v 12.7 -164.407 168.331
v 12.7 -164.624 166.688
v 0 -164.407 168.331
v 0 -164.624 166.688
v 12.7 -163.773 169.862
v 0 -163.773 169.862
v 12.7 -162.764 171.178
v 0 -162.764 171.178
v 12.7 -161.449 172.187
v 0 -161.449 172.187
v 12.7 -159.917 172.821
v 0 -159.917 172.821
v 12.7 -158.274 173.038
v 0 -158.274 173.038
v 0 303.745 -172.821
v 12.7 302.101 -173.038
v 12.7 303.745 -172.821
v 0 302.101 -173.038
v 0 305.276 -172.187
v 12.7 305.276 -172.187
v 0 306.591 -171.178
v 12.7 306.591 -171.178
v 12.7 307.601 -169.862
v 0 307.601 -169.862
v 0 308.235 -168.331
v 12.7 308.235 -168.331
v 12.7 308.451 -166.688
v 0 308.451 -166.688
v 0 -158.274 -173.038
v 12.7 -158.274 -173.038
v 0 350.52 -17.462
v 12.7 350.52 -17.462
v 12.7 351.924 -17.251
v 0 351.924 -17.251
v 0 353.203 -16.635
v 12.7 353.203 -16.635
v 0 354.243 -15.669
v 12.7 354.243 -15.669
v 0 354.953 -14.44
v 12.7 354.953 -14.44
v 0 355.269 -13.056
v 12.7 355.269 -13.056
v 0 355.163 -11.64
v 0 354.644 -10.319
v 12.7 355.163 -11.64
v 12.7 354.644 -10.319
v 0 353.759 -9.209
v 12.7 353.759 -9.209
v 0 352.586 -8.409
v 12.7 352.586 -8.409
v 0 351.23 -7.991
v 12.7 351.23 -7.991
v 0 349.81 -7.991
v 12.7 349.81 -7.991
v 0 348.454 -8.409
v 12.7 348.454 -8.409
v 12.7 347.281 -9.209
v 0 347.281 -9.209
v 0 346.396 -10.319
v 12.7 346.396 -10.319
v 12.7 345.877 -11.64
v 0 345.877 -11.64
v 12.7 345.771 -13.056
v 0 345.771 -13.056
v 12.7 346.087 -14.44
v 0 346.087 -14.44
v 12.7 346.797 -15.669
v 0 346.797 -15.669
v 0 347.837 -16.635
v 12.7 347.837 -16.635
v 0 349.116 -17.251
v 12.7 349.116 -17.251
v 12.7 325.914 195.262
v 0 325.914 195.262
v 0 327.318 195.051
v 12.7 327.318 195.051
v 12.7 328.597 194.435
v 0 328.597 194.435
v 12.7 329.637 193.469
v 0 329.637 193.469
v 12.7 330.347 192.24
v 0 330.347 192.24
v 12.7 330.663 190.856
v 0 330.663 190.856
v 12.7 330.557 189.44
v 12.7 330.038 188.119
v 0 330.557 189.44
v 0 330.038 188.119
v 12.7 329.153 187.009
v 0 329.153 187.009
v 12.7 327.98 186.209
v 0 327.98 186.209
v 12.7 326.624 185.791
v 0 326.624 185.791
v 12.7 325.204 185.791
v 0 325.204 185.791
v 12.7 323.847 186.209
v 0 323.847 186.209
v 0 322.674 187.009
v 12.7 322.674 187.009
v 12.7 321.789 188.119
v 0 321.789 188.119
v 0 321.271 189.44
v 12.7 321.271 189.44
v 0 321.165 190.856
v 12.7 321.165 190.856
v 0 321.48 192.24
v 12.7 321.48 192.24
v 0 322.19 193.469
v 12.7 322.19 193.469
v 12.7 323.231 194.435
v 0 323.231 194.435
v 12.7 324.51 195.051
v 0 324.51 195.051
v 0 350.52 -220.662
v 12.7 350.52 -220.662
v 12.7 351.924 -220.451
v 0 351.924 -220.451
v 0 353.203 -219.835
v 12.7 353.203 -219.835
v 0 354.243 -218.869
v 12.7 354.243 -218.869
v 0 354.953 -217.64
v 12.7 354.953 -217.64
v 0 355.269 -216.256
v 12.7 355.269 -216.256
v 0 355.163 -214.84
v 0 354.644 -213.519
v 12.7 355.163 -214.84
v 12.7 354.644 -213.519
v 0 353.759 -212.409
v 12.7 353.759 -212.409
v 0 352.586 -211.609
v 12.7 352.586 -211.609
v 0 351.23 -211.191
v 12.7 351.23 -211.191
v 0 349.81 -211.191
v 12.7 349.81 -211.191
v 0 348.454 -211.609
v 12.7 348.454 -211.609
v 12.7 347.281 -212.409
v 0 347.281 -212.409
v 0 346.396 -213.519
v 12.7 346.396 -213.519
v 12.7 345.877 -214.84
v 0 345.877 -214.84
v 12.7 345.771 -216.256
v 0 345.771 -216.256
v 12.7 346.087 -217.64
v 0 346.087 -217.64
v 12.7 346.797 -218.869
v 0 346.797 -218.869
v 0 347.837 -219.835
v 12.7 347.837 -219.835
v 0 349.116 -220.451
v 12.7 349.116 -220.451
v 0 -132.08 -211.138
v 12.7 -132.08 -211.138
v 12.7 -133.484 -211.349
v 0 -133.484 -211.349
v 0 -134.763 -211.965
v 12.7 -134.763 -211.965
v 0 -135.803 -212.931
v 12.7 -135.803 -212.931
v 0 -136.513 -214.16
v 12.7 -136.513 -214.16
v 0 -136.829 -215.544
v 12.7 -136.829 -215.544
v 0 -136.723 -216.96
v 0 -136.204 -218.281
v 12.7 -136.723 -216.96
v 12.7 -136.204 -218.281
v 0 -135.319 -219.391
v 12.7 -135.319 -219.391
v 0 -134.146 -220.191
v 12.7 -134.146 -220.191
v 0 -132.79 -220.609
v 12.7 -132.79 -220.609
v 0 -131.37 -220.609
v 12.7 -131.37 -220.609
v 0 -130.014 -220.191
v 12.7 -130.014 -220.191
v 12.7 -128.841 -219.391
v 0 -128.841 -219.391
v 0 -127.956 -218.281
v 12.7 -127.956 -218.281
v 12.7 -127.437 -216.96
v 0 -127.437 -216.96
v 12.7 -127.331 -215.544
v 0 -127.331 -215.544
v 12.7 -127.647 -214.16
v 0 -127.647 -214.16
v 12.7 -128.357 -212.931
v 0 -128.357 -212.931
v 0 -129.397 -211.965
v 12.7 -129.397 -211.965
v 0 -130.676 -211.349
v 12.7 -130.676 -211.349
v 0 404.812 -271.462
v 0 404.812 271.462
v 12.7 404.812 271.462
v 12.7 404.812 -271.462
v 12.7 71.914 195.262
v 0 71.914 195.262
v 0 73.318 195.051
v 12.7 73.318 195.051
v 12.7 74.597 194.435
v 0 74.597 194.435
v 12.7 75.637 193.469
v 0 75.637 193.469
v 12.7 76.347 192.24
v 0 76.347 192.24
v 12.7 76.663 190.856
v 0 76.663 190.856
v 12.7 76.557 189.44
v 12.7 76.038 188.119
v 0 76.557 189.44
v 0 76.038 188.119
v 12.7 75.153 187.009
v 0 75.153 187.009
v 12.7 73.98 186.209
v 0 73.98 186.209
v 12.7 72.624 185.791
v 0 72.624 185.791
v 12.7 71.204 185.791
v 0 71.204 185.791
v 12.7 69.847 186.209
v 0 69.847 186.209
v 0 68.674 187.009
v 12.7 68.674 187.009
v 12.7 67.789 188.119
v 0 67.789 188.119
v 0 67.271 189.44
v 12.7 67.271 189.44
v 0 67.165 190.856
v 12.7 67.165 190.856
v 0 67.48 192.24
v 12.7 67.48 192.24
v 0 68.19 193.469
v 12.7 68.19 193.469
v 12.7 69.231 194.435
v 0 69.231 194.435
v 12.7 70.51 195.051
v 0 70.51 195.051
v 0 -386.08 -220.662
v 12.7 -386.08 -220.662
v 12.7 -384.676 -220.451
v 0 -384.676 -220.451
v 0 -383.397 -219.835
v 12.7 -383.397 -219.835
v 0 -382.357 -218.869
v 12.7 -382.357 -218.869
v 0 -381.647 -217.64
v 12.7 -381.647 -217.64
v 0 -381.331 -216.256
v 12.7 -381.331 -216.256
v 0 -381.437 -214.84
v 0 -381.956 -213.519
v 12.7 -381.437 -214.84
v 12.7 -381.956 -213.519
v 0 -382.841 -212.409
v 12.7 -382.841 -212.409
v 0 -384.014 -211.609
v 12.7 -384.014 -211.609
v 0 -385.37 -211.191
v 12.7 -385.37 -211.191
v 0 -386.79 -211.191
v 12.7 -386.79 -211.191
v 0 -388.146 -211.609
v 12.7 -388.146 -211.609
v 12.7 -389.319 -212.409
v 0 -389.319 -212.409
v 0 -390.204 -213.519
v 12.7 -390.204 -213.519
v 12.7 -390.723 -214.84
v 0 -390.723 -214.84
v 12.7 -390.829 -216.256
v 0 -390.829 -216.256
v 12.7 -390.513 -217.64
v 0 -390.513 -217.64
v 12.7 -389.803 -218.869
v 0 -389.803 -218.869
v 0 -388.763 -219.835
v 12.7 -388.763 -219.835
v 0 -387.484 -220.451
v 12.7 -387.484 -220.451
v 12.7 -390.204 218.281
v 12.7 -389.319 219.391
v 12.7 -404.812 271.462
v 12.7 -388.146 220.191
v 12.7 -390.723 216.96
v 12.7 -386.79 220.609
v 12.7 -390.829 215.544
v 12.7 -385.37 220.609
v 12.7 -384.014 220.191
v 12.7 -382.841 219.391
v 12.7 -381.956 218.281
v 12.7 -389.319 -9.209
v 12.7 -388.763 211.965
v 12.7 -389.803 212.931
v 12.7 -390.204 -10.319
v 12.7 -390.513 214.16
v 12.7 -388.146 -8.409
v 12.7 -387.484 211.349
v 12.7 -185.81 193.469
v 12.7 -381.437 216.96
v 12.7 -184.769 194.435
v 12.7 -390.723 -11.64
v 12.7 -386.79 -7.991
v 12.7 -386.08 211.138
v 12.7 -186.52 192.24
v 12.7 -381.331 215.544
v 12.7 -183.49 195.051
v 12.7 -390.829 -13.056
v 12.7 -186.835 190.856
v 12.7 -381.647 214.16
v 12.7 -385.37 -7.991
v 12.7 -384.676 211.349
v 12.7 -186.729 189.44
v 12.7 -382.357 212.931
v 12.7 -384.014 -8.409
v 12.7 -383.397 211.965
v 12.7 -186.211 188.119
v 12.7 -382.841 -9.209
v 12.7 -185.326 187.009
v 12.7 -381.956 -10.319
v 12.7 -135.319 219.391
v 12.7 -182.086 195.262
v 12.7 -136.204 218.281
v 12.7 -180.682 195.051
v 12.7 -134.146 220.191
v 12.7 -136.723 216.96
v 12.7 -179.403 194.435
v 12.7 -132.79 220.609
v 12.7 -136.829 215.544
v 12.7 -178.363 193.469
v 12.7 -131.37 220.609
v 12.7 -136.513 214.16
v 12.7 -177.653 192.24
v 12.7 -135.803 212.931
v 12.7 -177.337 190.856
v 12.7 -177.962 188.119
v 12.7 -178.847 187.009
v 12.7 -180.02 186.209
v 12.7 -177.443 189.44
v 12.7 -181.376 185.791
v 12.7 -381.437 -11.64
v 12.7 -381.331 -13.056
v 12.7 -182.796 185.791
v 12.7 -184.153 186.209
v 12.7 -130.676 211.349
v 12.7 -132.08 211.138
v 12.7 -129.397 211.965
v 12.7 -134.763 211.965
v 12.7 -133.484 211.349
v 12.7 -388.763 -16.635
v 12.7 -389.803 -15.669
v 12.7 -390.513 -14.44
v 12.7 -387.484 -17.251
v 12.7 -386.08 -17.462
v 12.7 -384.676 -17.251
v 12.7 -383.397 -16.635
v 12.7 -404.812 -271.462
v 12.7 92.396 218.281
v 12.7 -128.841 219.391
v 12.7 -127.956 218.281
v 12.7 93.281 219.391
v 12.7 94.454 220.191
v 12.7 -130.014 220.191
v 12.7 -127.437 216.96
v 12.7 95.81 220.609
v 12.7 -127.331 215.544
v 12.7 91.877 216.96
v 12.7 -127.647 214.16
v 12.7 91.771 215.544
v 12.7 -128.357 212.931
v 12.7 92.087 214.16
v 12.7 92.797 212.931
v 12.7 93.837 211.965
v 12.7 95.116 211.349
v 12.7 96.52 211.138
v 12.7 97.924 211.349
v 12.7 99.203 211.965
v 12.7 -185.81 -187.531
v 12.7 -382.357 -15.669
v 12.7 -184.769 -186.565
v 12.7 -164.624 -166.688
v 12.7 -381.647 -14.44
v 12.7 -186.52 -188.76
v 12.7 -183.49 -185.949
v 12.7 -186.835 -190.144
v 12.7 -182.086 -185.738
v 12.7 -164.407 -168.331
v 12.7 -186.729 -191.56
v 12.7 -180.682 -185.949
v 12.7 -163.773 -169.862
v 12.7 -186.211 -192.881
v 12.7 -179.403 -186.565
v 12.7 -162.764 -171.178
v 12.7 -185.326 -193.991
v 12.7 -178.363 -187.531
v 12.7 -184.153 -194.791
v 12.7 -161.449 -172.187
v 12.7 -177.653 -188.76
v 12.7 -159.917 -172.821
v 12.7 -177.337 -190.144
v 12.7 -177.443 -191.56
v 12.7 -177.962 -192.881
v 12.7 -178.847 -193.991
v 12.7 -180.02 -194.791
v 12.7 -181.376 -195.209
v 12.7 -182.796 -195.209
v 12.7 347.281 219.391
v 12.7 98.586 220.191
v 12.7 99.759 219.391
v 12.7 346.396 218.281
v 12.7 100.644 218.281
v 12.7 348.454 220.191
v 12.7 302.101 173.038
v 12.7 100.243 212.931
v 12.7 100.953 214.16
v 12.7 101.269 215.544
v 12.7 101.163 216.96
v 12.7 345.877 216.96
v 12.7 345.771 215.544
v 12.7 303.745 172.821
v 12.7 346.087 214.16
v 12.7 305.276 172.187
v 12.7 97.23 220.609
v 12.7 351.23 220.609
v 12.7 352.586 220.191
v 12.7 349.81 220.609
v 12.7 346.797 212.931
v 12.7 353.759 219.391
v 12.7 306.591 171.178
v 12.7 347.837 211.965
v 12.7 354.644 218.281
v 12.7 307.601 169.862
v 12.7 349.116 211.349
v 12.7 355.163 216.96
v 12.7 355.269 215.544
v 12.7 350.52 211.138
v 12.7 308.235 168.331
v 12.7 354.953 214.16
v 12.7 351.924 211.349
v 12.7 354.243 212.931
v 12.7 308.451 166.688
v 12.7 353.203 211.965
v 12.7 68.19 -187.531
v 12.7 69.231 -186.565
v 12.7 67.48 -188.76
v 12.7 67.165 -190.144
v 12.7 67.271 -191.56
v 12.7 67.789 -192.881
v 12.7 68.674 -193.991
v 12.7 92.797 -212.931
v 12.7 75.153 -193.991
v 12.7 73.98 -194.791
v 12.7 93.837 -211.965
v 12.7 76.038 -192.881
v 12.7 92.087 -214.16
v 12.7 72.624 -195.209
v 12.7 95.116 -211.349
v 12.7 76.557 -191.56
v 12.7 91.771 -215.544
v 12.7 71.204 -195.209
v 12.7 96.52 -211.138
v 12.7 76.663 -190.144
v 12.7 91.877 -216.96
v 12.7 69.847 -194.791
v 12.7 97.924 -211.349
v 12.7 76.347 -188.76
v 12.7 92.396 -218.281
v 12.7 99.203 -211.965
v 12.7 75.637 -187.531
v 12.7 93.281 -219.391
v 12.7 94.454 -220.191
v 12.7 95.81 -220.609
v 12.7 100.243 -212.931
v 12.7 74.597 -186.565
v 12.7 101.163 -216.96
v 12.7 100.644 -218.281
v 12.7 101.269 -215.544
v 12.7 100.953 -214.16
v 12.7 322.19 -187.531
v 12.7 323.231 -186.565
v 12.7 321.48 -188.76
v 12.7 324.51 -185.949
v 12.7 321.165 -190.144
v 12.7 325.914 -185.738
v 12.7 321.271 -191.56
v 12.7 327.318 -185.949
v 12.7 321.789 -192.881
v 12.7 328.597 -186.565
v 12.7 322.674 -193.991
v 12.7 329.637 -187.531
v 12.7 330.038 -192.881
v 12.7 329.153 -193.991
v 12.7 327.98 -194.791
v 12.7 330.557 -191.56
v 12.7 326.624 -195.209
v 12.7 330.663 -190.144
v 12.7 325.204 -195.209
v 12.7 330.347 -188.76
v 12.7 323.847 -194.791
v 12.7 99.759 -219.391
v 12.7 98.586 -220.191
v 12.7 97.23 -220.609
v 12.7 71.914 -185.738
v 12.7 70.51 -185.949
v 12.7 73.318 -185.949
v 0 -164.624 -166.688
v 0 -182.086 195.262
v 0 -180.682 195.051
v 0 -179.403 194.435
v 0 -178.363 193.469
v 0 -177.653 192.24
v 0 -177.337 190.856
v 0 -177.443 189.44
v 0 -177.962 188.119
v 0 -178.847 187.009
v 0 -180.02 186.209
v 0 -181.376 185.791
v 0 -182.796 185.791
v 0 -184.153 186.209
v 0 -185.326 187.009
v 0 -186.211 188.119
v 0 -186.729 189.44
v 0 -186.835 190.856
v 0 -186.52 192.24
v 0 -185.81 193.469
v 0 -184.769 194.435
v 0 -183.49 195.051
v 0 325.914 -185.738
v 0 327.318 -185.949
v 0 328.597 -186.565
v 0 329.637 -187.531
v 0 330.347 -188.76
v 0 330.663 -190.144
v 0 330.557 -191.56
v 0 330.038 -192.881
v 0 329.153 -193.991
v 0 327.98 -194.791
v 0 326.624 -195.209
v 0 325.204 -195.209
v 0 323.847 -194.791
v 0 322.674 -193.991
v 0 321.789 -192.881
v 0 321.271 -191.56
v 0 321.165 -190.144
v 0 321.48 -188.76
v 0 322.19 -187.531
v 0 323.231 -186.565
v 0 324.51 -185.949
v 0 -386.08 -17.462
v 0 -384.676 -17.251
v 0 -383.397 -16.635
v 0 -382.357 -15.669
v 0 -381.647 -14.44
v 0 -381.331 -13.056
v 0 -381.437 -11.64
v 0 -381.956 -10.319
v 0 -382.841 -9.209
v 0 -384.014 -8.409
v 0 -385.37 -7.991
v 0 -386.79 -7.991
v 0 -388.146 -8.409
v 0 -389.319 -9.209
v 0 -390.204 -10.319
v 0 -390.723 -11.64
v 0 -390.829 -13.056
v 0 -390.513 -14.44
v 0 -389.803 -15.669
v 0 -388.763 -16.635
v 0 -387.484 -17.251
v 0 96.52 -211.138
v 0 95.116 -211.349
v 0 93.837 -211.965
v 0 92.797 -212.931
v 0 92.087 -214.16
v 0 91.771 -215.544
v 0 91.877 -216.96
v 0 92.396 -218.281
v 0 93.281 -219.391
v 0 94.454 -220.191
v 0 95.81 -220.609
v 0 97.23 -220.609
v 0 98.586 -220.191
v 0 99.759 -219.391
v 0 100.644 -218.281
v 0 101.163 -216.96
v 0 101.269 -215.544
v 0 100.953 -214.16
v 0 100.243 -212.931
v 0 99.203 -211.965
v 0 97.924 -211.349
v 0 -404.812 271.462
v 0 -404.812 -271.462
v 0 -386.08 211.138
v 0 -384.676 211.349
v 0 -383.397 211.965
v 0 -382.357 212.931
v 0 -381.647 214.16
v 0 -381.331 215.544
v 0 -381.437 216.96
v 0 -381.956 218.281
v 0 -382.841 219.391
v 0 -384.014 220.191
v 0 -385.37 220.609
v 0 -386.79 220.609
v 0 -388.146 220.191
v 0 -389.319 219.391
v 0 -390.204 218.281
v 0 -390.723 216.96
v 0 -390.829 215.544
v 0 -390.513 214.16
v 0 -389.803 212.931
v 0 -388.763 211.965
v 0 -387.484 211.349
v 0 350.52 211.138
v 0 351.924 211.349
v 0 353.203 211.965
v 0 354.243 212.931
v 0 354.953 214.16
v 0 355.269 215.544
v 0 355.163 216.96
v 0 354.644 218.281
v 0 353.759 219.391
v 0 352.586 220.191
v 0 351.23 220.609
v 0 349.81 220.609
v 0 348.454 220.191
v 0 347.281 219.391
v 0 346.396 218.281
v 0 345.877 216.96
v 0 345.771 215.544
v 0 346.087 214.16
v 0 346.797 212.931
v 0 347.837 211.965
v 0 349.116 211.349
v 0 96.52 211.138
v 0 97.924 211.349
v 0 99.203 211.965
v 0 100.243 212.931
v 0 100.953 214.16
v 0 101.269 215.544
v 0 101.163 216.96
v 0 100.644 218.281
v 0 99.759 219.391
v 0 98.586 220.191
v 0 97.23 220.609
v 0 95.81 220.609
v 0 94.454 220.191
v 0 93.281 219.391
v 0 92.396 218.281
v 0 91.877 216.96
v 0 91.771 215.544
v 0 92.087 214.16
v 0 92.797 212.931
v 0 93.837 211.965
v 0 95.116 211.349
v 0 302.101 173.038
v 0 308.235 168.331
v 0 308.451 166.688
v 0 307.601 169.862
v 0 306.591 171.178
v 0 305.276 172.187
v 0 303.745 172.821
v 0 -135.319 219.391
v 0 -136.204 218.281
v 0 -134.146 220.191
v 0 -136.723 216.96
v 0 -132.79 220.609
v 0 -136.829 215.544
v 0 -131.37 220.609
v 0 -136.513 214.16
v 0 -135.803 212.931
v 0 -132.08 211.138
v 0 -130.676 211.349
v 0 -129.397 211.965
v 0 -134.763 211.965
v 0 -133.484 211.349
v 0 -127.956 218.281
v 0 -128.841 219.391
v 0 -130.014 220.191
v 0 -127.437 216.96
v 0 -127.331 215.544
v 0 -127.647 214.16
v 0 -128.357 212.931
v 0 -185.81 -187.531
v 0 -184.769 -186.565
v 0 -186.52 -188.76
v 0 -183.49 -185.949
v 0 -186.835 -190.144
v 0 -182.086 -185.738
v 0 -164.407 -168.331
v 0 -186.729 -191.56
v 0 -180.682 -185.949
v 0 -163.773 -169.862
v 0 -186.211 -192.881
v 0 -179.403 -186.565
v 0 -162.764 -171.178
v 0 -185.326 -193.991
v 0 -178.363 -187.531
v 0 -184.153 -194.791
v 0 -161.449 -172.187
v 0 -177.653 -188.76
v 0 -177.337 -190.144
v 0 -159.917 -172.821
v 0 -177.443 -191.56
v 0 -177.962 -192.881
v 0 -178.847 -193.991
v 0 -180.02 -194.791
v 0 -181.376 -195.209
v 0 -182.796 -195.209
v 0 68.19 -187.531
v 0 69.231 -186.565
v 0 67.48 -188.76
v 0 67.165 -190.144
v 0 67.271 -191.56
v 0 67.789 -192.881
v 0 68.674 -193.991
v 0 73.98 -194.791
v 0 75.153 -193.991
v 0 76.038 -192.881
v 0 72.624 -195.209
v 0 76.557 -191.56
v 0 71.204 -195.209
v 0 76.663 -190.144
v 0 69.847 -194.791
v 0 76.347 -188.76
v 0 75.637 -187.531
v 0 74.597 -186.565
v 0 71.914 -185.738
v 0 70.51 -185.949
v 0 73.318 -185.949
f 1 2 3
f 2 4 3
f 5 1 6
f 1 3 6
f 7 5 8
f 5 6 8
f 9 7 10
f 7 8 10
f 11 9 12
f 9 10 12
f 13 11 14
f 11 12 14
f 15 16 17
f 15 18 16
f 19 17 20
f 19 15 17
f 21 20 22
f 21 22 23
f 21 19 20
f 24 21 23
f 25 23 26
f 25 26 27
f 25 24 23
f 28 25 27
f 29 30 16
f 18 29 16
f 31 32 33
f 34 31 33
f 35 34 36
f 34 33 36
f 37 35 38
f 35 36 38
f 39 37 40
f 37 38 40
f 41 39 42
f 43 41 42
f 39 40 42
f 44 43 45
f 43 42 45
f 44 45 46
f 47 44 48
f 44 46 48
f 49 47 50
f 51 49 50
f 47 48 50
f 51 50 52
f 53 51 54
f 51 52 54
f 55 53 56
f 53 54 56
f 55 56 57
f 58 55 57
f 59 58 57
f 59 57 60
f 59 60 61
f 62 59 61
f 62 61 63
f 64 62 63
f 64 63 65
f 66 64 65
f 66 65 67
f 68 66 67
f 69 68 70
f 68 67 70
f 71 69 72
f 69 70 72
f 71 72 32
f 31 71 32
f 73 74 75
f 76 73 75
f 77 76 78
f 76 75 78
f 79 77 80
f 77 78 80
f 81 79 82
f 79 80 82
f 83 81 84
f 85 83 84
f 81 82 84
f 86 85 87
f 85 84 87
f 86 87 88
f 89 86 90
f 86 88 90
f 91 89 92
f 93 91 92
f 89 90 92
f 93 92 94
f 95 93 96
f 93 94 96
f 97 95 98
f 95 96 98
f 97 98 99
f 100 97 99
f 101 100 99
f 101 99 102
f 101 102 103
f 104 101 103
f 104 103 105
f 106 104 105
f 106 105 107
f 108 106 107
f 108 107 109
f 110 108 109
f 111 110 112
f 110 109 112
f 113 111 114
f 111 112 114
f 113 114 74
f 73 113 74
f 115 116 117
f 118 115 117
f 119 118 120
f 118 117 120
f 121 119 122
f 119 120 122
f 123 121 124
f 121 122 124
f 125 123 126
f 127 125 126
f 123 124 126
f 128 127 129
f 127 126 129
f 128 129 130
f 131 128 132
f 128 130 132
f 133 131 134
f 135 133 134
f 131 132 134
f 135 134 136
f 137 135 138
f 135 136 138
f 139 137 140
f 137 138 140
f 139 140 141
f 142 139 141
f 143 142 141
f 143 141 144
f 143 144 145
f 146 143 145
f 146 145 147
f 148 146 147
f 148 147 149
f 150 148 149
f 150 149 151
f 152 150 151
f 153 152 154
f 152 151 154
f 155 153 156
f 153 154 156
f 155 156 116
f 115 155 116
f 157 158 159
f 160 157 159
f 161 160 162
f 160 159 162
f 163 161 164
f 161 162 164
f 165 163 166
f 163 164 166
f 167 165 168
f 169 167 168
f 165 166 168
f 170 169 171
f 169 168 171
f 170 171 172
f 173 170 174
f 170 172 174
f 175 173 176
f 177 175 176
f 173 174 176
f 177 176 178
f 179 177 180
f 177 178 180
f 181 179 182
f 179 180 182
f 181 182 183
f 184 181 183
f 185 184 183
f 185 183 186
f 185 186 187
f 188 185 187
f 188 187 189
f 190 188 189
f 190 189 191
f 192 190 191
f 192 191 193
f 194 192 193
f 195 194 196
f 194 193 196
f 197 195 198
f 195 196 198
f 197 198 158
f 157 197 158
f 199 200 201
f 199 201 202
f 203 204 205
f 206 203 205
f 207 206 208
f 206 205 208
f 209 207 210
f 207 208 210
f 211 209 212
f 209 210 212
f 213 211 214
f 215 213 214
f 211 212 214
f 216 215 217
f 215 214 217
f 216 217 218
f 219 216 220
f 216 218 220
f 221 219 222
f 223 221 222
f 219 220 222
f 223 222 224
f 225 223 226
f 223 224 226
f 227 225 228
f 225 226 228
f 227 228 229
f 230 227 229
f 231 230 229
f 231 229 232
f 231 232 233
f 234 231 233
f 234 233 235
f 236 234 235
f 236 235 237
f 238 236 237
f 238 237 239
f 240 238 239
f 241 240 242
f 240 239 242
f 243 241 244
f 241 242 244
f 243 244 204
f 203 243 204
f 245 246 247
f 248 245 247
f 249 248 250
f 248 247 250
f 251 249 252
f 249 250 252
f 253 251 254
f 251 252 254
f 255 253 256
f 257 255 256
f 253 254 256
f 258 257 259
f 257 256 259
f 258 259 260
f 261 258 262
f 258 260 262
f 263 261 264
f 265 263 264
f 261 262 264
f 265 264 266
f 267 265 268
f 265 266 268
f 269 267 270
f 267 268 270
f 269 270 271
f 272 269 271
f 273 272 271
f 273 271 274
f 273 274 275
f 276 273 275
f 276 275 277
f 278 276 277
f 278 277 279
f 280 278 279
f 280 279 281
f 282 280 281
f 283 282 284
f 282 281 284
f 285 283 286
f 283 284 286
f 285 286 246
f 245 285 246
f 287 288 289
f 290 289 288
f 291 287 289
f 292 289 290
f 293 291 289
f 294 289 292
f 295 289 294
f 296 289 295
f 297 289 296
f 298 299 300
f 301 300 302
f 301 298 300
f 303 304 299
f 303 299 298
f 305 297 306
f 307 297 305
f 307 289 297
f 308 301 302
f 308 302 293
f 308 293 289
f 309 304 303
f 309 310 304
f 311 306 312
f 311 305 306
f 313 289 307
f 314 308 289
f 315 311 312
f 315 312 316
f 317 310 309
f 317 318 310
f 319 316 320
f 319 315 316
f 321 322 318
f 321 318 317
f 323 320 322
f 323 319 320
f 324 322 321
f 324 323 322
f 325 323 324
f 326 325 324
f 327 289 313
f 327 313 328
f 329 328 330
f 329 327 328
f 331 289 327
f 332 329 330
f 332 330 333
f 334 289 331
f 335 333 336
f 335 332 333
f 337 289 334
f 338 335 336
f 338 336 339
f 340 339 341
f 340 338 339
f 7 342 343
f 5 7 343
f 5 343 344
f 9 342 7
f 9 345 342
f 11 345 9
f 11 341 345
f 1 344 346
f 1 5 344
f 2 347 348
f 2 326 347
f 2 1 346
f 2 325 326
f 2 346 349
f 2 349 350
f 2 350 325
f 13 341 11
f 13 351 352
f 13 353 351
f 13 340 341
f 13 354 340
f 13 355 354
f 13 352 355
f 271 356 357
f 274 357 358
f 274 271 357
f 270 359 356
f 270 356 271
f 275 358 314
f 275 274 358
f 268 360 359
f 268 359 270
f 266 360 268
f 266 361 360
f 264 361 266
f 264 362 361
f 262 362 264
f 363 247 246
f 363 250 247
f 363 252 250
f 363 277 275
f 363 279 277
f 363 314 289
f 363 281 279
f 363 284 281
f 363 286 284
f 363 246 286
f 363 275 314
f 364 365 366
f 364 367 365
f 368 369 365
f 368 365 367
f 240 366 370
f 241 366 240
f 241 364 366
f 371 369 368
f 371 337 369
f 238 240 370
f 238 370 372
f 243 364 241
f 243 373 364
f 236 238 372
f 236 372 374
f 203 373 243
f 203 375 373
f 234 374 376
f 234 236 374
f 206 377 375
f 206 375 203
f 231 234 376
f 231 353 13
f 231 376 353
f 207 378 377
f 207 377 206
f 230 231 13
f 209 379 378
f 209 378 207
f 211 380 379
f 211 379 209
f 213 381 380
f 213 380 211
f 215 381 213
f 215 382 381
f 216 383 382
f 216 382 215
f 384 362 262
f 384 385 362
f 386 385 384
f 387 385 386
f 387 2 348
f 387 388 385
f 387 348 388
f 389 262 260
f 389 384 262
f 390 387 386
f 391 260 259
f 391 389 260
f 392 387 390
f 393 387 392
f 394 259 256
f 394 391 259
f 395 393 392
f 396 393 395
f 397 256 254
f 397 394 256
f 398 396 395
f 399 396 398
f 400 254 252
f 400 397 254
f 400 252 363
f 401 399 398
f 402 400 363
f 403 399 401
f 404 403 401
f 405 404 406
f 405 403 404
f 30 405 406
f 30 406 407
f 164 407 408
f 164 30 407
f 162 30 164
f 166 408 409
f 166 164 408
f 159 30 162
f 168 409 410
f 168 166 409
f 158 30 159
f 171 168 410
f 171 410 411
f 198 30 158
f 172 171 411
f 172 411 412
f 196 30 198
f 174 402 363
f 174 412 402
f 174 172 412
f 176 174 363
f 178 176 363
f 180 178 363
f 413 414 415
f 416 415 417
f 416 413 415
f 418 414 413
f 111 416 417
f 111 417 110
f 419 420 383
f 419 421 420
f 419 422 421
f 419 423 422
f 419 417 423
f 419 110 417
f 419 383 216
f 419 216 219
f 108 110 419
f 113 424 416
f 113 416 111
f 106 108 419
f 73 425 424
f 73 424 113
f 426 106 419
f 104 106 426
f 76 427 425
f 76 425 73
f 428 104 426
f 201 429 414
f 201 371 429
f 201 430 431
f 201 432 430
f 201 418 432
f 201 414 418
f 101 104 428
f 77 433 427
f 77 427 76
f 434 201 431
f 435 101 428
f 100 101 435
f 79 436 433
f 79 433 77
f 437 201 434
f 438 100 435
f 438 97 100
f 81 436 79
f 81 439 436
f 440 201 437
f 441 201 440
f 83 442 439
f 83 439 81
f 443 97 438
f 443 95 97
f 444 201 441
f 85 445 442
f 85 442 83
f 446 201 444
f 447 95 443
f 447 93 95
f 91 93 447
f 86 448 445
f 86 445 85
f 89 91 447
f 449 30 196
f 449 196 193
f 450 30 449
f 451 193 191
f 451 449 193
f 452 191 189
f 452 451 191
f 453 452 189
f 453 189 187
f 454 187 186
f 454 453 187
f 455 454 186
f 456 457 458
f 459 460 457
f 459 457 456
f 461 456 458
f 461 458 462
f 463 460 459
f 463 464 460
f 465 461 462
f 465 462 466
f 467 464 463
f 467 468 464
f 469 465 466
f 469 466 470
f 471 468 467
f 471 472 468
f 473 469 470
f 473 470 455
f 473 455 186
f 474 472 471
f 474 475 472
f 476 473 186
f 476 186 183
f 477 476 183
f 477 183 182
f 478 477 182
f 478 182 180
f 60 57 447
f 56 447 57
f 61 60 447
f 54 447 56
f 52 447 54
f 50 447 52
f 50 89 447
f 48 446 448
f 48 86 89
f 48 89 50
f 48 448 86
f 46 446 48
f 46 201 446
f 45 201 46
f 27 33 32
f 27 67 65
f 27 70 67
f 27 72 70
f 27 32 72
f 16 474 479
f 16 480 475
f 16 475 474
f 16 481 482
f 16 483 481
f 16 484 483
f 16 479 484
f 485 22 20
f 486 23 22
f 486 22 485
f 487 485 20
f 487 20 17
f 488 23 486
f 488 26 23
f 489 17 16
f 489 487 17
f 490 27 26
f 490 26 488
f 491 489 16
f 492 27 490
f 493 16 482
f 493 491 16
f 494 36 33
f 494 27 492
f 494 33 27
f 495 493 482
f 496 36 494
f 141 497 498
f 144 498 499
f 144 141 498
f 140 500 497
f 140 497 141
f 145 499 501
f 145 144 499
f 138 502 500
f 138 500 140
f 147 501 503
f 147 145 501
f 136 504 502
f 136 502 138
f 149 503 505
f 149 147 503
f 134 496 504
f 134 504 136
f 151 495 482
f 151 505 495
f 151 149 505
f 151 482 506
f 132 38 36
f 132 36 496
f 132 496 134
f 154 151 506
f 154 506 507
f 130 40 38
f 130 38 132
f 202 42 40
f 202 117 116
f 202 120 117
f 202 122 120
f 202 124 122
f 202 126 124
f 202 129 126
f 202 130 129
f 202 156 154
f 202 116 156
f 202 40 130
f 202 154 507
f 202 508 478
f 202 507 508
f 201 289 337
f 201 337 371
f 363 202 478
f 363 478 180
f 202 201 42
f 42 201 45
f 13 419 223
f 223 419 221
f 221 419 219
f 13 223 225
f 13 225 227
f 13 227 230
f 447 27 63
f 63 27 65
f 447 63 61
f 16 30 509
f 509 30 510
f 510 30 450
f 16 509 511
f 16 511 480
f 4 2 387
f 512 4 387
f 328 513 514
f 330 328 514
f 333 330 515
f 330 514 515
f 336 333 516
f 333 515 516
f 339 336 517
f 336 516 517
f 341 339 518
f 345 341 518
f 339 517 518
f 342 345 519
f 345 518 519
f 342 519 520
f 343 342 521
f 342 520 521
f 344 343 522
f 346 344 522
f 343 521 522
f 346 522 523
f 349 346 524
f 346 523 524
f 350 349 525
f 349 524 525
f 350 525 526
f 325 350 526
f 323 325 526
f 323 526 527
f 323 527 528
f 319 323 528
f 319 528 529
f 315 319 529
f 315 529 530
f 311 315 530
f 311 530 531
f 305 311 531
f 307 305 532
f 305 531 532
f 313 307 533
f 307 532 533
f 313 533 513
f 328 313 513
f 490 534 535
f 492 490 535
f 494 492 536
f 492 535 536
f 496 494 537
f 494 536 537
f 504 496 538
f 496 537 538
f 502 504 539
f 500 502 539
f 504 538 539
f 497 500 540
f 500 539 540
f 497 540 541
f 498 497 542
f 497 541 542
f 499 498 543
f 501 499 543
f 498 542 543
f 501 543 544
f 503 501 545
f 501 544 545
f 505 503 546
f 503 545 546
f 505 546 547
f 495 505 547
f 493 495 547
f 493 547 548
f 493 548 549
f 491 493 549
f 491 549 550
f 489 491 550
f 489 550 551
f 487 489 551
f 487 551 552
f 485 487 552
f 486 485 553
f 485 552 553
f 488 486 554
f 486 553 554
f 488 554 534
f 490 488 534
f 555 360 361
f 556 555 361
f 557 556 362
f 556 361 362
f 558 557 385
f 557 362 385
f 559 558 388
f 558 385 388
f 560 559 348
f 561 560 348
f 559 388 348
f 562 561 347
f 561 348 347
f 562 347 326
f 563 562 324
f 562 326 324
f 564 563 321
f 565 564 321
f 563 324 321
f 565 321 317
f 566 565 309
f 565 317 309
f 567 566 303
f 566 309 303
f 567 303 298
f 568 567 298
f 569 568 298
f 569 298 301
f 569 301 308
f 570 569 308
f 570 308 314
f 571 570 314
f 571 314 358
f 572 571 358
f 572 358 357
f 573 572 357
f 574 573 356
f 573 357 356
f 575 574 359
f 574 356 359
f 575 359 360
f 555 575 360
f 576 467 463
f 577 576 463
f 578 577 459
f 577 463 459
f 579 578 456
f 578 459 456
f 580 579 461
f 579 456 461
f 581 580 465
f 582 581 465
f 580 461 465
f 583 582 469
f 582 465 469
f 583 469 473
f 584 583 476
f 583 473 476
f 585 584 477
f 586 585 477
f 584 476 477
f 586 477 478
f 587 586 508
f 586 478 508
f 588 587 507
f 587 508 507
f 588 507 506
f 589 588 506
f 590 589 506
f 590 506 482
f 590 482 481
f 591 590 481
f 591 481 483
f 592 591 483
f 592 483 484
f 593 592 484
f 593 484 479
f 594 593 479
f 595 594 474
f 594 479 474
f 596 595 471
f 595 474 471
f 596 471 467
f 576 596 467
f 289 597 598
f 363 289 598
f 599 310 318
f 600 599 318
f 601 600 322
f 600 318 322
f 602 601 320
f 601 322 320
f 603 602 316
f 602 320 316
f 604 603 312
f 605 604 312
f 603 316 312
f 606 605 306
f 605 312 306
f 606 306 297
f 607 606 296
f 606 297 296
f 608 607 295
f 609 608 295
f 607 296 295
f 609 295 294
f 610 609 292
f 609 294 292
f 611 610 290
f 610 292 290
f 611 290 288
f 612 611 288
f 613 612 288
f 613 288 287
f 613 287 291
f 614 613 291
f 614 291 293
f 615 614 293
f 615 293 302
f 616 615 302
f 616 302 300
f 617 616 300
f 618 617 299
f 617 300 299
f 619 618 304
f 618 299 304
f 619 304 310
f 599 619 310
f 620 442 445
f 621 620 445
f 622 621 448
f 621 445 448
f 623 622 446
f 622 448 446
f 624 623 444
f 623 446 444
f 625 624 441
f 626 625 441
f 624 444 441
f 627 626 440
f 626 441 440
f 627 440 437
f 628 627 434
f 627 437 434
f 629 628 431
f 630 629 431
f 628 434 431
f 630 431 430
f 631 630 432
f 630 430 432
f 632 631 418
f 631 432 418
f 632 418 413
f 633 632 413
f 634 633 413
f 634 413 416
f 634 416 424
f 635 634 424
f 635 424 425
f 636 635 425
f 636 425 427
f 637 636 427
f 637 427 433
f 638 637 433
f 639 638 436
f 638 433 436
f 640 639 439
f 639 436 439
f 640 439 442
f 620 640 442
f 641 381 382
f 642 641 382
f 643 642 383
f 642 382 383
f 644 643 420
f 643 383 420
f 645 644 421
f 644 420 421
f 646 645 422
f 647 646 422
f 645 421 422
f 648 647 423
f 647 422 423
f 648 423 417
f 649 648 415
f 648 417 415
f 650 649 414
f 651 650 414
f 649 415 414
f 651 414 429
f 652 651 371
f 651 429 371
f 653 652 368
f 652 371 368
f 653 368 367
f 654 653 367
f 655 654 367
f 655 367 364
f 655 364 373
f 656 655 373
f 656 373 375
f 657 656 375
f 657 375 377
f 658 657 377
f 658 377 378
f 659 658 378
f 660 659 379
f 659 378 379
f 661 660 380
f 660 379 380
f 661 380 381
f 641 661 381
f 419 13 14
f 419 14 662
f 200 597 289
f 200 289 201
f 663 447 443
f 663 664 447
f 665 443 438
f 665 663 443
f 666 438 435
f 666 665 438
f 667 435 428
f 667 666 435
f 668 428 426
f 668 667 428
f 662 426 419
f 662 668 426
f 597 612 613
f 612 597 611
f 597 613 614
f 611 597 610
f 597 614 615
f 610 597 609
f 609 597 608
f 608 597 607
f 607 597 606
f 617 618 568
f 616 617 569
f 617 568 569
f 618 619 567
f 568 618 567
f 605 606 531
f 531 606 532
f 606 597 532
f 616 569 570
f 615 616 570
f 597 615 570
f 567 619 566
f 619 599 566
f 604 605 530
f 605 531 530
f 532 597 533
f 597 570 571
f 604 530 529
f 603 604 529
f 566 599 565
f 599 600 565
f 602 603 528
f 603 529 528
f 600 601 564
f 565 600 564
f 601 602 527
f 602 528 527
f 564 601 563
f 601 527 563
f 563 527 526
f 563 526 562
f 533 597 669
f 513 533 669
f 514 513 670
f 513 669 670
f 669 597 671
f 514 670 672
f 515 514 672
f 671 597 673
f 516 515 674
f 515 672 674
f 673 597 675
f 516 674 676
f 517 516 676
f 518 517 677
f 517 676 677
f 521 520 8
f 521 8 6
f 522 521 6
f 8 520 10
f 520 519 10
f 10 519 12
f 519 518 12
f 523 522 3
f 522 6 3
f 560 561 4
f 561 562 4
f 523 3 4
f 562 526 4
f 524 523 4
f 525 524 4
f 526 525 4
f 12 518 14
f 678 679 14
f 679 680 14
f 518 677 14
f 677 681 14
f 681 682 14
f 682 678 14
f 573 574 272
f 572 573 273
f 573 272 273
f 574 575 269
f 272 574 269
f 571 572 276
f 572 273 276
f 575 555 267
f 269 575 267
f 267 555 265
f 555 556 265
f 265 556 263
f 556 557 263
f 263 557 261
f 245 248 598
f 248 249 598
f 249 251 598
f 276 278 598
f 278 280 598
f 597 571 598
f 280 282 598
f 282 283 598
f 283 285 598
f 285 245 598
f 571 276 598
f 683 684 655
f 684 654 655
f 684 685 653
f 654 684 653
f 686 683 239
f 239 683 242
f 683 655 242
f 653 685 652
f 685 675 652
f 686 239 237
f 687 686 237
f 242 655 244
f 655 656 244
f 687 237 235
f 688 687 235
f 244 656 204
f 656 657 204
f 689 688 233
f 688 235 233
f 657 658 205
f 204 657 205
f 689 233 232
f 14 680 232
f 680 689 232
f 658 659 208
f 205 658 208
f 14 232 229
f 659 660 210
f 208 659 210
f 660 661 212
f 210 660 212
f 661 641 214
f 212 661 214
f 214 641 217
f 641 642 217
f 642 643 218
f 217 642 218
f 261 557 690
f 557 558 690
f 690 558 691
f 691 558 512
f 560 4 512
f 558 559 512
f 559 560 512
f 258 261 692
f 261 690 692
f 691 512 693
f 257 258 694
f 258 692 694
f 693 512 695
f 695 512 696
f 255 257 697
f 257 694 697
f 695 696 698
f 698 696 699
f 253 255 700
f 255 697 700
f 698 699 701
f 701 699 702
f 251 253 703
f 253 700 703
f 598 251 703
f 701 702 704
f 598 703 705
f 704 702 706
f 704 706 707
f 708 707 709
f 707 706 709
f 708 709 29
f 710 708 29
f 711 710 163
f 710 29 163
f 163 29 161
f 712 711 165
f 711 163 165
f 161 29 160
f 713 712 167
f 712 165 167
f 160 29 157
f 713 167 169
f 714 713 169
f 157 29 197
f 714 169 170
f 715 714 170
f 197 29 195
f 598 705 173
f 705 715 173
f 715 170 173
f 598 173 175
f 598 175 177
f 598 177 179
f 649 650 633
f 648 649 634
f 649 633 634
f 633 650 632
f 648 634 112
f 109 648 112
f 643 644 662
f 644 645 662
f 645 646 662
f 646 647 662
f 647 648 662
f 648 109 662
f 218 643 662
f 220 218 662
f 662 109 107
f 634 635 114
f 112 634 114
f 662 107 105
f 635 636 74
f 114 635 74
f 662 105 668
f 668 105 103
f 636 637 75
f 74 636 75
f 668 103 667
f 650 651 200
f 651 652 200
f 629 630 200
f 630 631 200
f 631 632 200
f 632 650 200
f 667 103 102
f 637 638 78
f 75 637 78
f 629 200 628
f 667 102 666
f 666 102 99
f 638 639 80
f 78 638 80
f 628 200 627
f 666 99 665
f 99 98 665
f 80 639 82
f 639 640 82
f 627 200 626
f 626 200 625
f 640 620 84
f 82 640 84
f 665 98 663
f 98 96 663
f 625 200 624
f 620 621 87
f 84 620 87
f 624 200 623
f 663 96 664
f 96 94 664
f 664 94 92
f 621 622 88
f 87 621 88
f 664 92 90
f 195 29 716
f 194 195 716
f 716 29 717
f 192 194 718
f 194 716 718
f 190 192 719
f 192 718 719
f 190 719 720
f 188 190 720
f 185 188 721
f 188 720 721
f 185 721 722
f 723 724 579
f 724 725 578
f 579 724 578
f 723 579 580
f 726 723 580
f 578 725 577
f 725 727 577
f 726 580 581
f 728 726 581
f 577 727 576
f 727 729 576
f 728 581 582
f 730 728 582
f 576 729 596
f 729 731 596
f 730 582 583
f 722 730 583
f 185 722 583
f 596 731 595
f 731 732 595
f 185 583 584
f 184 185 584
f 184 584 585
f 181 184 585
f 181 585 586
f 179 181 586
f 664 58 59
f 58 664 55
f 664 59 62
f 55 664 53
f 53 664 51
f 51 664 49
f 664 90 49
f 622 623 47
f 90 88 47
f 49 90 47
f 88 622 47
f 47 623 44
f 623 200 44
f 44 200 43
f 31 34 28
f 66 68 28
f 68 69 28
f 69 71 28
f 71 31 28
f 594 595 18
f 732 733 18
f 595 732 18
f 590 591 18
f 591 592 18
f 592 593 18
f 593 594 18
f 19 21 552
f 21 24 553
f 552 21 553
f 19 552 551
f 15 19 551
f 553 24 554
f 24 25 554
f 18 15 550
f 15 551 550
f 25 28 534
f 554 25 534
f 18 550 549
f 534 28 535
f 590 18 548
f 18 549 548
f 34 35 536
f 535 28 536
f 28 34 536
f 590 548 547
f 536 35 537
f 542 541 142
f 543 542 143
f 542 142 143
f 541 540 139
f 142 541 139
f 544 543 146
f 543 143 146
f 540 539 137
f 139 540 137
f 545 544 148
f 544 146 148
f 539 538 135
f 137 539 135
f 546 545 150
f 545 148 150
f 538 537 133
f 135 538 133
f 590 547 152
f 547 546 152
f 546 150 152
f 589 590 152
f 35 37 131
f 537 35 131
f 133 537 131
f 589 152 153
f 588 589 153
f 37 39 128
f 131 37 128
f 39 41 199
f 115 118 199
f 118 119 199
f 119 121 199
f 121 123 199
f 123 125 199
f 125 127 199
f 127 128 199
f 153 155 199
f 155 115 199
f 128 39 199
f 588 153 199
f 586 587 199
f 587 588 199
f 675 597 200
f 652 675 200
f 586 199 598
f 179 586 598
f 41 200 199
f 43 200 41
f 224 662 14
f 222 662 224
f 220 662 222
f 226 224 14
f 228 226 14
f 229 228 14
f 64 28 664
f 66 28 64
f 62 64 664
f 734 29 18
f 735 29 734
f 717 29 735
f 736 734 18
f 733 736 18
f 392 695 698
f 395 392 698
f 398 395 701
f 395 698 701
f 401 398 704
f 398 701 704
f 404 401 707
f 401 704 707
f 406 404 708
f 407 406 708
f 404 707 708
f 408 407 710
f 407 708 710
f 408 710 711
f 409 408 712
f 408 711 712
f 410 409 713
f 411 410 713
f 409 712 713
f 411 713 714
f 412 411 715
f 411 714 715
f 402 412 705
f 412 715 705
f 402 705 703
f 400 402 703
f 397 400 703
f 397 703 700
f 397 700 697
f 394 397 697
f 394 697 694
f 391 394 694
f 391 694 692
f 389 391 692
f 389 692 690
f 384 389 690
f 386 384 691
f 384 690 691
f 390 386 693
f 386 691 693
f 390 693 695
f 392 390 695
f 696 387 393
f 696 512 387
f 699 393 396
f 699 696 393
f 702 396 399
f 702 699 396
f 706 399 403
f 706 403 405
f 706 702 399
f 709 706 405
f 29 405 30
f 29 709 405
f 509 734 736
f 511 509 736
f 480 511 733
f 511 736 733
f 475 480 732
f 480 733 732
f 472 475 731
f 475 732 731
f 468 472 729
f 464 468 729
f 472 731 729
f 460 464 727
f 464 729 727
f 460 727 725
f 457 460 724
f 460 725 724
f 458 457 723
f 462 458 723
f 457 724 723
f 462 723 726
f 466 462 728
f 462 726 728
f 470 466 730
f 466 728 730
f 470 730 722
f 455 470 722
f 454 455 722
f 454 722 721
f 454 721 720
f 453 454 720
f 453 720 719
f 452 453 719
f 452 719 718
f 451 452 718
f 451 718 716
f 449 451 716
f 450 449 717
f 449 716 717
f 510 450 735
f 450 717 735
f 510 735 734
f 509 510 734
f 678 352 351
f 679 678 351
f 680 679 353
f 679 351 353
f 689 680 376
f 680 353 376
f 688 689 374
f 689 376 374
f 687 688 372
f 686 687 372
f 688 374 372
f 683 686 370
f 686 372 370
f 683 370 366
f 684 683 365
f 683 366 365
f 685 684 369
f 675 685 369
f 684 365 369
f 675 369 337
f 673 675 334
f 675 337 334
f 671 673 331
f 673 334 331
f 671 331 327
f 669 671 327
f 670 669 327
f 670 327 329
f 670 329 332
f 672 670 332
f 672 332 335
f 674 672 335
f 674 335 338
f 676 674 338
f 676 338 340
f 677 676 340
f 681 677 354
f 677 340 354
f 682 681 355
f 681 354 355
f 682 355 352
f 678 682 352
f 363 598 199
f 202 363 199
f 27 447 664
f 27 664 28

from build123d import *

# Parameters (mm, degrees)
SKETCH1_W           = 542.925
SKETCH1_H           = 809.625
BOSS_EXTRUDE1_DEPTH = 12.7
SKETCH2_R           = 4.7625
CUT_EXTRUDE1_DEPTH  = 12.7
SKETCH3_R           = 4.7625
CUT_EXTRUDE2_DEPTH  = 12.7
SKETCH6_R           = 4.7625
CUT_EXTRUDE4_DEPTH  = 12.7
SKETCH7_R           = 4.7625
CUT_EXTRUDE5_DEPTH  = 12.7
SKETCH9_W           = 346.075
SKETCH9_H           = 473.075
CUT_EXTRUDE6_DEPTH  = 12.7
FILLET1_R           = 6.35


with BuildPart() as part:
    # Sketch1 → Boss-Extrude1 (new body)
    with BuildSketch(Plane(origin=(0, 0, 0), x_dir=(0, 0, -1), z_dir=(1, 0, 0))):
        Rectangle(SKETCH1_W, SKETCH1_H)
    extrude(amount=BOSS_EXTRUDE1_DEPTH)

    # Sketch2 → Cut-Extrude1 (cut)
    with BuildSketch(Plane(origin=(12.7, 0, 0), x_dir=(0, 0, -1), z_dir=(1, 0, 0))):
        with Locations((-215.9, 350.52)):
            Circle(SKETCH2_R)
        with Locations((215.9, 350.52)):
            Circle(SKETCH2_R)
        with Locations((-215.9, -386.08)):
            Circle(SKETCH2_R)
        with Locations((215.9, -386.08)):
            Circle(SKETCH2_R)
    extrude(amount=-CUT_EXTRUDE1_DEPTH, mode=Mode.SUBTRACT)

    # Sketch3 → Cut-Extrude2 (cut)
    with BuildSketch(Plane(origin=(12.7, 0, 0), x_dir=(0, 0, -1), z_dir=(1, 0, 0))):
        with Locations((-215.9, 96.52)):
            Circle(SKETCH3_R)
        with Locations((-215.9, -132.08)):
            Circle(SKETCH3_R)
        with Locations((12.7, 350.52)):
            Circle(SKETCH3_R)
        with Locations((12.7, -386.08)):
            Circle(SKETCH3_R)
        with Locations(Location((215.9, -132.08, 0), (0, 0, 180))):
            Circle(SKETCH3_R)
        with Locations(Location((215.9, 96.52, 0), (0, 0, 180))):
            Circle(SKETCH3_R)
    extrude(amount=-CUT_EXTRUDE2_DEPTH, mode=Mode.SUBTRACT)

    # Sketch6 → Cut-Extrude4 (cut)
    with BuildSketch(Plane.ZY):
        with Locations((-190.5, 325.91375)):
            Circle(SKETCH6_R)
        with Locations((190.5, 325.91375)):
            Circle(SKETCH6_R)
        with Locations((-190.5, -182.08625)):
            Circle(SKETCH6_R)
        with Locations((190.5, -182.08625)):
            Circle(SKETCH6_R)
    extrude(amount=-CUT_EXTRUDE4_DEPTH, mode=Mode.SUBTRACT)

    # Sketch7 → Cut-Extrude5 (cut)
    with BuildSketch(Plane.ZY):
        with Locations((-190.5, 71.91375)):
            Circle(SKETCH7_R)
        with Locations((190.5, 71.91375)):
            Circle(SKETCH7_R)
    extrude(amount=-CUT_EXTRUDE5_DEPTH, mode=Mode.SUBTRACT)

    # Sketch9 → Cut-Extrude6 (cut)
    with BuildSketch(Plane(origin=(12.7, 0, 0), x_dir=(0, 0, -1), z_dir=(1, 0, 0))):
        with Locations((0, 71.91375)):
            Rectangle(SKETCH9_W, SKETCH9_H)
    extrude(amount=-CUT_EXTRUDE6_DEPTH, mode=Mode.SUBTRACT)

    # Fillet1
    fillet1_edges = [part.edges().sort_by_distance(p)[0] for p in [
        (6.35, -164.62375, -173.0375),
        (6.35, -164.62375, 173.0375),
        (6.35, 308.45125, 173.0375),
        (6.35, 308.45125, -173.0375),
    ]]
    fillet(fillet1_edges, radius=FILLET1_R)


solid = part.part
